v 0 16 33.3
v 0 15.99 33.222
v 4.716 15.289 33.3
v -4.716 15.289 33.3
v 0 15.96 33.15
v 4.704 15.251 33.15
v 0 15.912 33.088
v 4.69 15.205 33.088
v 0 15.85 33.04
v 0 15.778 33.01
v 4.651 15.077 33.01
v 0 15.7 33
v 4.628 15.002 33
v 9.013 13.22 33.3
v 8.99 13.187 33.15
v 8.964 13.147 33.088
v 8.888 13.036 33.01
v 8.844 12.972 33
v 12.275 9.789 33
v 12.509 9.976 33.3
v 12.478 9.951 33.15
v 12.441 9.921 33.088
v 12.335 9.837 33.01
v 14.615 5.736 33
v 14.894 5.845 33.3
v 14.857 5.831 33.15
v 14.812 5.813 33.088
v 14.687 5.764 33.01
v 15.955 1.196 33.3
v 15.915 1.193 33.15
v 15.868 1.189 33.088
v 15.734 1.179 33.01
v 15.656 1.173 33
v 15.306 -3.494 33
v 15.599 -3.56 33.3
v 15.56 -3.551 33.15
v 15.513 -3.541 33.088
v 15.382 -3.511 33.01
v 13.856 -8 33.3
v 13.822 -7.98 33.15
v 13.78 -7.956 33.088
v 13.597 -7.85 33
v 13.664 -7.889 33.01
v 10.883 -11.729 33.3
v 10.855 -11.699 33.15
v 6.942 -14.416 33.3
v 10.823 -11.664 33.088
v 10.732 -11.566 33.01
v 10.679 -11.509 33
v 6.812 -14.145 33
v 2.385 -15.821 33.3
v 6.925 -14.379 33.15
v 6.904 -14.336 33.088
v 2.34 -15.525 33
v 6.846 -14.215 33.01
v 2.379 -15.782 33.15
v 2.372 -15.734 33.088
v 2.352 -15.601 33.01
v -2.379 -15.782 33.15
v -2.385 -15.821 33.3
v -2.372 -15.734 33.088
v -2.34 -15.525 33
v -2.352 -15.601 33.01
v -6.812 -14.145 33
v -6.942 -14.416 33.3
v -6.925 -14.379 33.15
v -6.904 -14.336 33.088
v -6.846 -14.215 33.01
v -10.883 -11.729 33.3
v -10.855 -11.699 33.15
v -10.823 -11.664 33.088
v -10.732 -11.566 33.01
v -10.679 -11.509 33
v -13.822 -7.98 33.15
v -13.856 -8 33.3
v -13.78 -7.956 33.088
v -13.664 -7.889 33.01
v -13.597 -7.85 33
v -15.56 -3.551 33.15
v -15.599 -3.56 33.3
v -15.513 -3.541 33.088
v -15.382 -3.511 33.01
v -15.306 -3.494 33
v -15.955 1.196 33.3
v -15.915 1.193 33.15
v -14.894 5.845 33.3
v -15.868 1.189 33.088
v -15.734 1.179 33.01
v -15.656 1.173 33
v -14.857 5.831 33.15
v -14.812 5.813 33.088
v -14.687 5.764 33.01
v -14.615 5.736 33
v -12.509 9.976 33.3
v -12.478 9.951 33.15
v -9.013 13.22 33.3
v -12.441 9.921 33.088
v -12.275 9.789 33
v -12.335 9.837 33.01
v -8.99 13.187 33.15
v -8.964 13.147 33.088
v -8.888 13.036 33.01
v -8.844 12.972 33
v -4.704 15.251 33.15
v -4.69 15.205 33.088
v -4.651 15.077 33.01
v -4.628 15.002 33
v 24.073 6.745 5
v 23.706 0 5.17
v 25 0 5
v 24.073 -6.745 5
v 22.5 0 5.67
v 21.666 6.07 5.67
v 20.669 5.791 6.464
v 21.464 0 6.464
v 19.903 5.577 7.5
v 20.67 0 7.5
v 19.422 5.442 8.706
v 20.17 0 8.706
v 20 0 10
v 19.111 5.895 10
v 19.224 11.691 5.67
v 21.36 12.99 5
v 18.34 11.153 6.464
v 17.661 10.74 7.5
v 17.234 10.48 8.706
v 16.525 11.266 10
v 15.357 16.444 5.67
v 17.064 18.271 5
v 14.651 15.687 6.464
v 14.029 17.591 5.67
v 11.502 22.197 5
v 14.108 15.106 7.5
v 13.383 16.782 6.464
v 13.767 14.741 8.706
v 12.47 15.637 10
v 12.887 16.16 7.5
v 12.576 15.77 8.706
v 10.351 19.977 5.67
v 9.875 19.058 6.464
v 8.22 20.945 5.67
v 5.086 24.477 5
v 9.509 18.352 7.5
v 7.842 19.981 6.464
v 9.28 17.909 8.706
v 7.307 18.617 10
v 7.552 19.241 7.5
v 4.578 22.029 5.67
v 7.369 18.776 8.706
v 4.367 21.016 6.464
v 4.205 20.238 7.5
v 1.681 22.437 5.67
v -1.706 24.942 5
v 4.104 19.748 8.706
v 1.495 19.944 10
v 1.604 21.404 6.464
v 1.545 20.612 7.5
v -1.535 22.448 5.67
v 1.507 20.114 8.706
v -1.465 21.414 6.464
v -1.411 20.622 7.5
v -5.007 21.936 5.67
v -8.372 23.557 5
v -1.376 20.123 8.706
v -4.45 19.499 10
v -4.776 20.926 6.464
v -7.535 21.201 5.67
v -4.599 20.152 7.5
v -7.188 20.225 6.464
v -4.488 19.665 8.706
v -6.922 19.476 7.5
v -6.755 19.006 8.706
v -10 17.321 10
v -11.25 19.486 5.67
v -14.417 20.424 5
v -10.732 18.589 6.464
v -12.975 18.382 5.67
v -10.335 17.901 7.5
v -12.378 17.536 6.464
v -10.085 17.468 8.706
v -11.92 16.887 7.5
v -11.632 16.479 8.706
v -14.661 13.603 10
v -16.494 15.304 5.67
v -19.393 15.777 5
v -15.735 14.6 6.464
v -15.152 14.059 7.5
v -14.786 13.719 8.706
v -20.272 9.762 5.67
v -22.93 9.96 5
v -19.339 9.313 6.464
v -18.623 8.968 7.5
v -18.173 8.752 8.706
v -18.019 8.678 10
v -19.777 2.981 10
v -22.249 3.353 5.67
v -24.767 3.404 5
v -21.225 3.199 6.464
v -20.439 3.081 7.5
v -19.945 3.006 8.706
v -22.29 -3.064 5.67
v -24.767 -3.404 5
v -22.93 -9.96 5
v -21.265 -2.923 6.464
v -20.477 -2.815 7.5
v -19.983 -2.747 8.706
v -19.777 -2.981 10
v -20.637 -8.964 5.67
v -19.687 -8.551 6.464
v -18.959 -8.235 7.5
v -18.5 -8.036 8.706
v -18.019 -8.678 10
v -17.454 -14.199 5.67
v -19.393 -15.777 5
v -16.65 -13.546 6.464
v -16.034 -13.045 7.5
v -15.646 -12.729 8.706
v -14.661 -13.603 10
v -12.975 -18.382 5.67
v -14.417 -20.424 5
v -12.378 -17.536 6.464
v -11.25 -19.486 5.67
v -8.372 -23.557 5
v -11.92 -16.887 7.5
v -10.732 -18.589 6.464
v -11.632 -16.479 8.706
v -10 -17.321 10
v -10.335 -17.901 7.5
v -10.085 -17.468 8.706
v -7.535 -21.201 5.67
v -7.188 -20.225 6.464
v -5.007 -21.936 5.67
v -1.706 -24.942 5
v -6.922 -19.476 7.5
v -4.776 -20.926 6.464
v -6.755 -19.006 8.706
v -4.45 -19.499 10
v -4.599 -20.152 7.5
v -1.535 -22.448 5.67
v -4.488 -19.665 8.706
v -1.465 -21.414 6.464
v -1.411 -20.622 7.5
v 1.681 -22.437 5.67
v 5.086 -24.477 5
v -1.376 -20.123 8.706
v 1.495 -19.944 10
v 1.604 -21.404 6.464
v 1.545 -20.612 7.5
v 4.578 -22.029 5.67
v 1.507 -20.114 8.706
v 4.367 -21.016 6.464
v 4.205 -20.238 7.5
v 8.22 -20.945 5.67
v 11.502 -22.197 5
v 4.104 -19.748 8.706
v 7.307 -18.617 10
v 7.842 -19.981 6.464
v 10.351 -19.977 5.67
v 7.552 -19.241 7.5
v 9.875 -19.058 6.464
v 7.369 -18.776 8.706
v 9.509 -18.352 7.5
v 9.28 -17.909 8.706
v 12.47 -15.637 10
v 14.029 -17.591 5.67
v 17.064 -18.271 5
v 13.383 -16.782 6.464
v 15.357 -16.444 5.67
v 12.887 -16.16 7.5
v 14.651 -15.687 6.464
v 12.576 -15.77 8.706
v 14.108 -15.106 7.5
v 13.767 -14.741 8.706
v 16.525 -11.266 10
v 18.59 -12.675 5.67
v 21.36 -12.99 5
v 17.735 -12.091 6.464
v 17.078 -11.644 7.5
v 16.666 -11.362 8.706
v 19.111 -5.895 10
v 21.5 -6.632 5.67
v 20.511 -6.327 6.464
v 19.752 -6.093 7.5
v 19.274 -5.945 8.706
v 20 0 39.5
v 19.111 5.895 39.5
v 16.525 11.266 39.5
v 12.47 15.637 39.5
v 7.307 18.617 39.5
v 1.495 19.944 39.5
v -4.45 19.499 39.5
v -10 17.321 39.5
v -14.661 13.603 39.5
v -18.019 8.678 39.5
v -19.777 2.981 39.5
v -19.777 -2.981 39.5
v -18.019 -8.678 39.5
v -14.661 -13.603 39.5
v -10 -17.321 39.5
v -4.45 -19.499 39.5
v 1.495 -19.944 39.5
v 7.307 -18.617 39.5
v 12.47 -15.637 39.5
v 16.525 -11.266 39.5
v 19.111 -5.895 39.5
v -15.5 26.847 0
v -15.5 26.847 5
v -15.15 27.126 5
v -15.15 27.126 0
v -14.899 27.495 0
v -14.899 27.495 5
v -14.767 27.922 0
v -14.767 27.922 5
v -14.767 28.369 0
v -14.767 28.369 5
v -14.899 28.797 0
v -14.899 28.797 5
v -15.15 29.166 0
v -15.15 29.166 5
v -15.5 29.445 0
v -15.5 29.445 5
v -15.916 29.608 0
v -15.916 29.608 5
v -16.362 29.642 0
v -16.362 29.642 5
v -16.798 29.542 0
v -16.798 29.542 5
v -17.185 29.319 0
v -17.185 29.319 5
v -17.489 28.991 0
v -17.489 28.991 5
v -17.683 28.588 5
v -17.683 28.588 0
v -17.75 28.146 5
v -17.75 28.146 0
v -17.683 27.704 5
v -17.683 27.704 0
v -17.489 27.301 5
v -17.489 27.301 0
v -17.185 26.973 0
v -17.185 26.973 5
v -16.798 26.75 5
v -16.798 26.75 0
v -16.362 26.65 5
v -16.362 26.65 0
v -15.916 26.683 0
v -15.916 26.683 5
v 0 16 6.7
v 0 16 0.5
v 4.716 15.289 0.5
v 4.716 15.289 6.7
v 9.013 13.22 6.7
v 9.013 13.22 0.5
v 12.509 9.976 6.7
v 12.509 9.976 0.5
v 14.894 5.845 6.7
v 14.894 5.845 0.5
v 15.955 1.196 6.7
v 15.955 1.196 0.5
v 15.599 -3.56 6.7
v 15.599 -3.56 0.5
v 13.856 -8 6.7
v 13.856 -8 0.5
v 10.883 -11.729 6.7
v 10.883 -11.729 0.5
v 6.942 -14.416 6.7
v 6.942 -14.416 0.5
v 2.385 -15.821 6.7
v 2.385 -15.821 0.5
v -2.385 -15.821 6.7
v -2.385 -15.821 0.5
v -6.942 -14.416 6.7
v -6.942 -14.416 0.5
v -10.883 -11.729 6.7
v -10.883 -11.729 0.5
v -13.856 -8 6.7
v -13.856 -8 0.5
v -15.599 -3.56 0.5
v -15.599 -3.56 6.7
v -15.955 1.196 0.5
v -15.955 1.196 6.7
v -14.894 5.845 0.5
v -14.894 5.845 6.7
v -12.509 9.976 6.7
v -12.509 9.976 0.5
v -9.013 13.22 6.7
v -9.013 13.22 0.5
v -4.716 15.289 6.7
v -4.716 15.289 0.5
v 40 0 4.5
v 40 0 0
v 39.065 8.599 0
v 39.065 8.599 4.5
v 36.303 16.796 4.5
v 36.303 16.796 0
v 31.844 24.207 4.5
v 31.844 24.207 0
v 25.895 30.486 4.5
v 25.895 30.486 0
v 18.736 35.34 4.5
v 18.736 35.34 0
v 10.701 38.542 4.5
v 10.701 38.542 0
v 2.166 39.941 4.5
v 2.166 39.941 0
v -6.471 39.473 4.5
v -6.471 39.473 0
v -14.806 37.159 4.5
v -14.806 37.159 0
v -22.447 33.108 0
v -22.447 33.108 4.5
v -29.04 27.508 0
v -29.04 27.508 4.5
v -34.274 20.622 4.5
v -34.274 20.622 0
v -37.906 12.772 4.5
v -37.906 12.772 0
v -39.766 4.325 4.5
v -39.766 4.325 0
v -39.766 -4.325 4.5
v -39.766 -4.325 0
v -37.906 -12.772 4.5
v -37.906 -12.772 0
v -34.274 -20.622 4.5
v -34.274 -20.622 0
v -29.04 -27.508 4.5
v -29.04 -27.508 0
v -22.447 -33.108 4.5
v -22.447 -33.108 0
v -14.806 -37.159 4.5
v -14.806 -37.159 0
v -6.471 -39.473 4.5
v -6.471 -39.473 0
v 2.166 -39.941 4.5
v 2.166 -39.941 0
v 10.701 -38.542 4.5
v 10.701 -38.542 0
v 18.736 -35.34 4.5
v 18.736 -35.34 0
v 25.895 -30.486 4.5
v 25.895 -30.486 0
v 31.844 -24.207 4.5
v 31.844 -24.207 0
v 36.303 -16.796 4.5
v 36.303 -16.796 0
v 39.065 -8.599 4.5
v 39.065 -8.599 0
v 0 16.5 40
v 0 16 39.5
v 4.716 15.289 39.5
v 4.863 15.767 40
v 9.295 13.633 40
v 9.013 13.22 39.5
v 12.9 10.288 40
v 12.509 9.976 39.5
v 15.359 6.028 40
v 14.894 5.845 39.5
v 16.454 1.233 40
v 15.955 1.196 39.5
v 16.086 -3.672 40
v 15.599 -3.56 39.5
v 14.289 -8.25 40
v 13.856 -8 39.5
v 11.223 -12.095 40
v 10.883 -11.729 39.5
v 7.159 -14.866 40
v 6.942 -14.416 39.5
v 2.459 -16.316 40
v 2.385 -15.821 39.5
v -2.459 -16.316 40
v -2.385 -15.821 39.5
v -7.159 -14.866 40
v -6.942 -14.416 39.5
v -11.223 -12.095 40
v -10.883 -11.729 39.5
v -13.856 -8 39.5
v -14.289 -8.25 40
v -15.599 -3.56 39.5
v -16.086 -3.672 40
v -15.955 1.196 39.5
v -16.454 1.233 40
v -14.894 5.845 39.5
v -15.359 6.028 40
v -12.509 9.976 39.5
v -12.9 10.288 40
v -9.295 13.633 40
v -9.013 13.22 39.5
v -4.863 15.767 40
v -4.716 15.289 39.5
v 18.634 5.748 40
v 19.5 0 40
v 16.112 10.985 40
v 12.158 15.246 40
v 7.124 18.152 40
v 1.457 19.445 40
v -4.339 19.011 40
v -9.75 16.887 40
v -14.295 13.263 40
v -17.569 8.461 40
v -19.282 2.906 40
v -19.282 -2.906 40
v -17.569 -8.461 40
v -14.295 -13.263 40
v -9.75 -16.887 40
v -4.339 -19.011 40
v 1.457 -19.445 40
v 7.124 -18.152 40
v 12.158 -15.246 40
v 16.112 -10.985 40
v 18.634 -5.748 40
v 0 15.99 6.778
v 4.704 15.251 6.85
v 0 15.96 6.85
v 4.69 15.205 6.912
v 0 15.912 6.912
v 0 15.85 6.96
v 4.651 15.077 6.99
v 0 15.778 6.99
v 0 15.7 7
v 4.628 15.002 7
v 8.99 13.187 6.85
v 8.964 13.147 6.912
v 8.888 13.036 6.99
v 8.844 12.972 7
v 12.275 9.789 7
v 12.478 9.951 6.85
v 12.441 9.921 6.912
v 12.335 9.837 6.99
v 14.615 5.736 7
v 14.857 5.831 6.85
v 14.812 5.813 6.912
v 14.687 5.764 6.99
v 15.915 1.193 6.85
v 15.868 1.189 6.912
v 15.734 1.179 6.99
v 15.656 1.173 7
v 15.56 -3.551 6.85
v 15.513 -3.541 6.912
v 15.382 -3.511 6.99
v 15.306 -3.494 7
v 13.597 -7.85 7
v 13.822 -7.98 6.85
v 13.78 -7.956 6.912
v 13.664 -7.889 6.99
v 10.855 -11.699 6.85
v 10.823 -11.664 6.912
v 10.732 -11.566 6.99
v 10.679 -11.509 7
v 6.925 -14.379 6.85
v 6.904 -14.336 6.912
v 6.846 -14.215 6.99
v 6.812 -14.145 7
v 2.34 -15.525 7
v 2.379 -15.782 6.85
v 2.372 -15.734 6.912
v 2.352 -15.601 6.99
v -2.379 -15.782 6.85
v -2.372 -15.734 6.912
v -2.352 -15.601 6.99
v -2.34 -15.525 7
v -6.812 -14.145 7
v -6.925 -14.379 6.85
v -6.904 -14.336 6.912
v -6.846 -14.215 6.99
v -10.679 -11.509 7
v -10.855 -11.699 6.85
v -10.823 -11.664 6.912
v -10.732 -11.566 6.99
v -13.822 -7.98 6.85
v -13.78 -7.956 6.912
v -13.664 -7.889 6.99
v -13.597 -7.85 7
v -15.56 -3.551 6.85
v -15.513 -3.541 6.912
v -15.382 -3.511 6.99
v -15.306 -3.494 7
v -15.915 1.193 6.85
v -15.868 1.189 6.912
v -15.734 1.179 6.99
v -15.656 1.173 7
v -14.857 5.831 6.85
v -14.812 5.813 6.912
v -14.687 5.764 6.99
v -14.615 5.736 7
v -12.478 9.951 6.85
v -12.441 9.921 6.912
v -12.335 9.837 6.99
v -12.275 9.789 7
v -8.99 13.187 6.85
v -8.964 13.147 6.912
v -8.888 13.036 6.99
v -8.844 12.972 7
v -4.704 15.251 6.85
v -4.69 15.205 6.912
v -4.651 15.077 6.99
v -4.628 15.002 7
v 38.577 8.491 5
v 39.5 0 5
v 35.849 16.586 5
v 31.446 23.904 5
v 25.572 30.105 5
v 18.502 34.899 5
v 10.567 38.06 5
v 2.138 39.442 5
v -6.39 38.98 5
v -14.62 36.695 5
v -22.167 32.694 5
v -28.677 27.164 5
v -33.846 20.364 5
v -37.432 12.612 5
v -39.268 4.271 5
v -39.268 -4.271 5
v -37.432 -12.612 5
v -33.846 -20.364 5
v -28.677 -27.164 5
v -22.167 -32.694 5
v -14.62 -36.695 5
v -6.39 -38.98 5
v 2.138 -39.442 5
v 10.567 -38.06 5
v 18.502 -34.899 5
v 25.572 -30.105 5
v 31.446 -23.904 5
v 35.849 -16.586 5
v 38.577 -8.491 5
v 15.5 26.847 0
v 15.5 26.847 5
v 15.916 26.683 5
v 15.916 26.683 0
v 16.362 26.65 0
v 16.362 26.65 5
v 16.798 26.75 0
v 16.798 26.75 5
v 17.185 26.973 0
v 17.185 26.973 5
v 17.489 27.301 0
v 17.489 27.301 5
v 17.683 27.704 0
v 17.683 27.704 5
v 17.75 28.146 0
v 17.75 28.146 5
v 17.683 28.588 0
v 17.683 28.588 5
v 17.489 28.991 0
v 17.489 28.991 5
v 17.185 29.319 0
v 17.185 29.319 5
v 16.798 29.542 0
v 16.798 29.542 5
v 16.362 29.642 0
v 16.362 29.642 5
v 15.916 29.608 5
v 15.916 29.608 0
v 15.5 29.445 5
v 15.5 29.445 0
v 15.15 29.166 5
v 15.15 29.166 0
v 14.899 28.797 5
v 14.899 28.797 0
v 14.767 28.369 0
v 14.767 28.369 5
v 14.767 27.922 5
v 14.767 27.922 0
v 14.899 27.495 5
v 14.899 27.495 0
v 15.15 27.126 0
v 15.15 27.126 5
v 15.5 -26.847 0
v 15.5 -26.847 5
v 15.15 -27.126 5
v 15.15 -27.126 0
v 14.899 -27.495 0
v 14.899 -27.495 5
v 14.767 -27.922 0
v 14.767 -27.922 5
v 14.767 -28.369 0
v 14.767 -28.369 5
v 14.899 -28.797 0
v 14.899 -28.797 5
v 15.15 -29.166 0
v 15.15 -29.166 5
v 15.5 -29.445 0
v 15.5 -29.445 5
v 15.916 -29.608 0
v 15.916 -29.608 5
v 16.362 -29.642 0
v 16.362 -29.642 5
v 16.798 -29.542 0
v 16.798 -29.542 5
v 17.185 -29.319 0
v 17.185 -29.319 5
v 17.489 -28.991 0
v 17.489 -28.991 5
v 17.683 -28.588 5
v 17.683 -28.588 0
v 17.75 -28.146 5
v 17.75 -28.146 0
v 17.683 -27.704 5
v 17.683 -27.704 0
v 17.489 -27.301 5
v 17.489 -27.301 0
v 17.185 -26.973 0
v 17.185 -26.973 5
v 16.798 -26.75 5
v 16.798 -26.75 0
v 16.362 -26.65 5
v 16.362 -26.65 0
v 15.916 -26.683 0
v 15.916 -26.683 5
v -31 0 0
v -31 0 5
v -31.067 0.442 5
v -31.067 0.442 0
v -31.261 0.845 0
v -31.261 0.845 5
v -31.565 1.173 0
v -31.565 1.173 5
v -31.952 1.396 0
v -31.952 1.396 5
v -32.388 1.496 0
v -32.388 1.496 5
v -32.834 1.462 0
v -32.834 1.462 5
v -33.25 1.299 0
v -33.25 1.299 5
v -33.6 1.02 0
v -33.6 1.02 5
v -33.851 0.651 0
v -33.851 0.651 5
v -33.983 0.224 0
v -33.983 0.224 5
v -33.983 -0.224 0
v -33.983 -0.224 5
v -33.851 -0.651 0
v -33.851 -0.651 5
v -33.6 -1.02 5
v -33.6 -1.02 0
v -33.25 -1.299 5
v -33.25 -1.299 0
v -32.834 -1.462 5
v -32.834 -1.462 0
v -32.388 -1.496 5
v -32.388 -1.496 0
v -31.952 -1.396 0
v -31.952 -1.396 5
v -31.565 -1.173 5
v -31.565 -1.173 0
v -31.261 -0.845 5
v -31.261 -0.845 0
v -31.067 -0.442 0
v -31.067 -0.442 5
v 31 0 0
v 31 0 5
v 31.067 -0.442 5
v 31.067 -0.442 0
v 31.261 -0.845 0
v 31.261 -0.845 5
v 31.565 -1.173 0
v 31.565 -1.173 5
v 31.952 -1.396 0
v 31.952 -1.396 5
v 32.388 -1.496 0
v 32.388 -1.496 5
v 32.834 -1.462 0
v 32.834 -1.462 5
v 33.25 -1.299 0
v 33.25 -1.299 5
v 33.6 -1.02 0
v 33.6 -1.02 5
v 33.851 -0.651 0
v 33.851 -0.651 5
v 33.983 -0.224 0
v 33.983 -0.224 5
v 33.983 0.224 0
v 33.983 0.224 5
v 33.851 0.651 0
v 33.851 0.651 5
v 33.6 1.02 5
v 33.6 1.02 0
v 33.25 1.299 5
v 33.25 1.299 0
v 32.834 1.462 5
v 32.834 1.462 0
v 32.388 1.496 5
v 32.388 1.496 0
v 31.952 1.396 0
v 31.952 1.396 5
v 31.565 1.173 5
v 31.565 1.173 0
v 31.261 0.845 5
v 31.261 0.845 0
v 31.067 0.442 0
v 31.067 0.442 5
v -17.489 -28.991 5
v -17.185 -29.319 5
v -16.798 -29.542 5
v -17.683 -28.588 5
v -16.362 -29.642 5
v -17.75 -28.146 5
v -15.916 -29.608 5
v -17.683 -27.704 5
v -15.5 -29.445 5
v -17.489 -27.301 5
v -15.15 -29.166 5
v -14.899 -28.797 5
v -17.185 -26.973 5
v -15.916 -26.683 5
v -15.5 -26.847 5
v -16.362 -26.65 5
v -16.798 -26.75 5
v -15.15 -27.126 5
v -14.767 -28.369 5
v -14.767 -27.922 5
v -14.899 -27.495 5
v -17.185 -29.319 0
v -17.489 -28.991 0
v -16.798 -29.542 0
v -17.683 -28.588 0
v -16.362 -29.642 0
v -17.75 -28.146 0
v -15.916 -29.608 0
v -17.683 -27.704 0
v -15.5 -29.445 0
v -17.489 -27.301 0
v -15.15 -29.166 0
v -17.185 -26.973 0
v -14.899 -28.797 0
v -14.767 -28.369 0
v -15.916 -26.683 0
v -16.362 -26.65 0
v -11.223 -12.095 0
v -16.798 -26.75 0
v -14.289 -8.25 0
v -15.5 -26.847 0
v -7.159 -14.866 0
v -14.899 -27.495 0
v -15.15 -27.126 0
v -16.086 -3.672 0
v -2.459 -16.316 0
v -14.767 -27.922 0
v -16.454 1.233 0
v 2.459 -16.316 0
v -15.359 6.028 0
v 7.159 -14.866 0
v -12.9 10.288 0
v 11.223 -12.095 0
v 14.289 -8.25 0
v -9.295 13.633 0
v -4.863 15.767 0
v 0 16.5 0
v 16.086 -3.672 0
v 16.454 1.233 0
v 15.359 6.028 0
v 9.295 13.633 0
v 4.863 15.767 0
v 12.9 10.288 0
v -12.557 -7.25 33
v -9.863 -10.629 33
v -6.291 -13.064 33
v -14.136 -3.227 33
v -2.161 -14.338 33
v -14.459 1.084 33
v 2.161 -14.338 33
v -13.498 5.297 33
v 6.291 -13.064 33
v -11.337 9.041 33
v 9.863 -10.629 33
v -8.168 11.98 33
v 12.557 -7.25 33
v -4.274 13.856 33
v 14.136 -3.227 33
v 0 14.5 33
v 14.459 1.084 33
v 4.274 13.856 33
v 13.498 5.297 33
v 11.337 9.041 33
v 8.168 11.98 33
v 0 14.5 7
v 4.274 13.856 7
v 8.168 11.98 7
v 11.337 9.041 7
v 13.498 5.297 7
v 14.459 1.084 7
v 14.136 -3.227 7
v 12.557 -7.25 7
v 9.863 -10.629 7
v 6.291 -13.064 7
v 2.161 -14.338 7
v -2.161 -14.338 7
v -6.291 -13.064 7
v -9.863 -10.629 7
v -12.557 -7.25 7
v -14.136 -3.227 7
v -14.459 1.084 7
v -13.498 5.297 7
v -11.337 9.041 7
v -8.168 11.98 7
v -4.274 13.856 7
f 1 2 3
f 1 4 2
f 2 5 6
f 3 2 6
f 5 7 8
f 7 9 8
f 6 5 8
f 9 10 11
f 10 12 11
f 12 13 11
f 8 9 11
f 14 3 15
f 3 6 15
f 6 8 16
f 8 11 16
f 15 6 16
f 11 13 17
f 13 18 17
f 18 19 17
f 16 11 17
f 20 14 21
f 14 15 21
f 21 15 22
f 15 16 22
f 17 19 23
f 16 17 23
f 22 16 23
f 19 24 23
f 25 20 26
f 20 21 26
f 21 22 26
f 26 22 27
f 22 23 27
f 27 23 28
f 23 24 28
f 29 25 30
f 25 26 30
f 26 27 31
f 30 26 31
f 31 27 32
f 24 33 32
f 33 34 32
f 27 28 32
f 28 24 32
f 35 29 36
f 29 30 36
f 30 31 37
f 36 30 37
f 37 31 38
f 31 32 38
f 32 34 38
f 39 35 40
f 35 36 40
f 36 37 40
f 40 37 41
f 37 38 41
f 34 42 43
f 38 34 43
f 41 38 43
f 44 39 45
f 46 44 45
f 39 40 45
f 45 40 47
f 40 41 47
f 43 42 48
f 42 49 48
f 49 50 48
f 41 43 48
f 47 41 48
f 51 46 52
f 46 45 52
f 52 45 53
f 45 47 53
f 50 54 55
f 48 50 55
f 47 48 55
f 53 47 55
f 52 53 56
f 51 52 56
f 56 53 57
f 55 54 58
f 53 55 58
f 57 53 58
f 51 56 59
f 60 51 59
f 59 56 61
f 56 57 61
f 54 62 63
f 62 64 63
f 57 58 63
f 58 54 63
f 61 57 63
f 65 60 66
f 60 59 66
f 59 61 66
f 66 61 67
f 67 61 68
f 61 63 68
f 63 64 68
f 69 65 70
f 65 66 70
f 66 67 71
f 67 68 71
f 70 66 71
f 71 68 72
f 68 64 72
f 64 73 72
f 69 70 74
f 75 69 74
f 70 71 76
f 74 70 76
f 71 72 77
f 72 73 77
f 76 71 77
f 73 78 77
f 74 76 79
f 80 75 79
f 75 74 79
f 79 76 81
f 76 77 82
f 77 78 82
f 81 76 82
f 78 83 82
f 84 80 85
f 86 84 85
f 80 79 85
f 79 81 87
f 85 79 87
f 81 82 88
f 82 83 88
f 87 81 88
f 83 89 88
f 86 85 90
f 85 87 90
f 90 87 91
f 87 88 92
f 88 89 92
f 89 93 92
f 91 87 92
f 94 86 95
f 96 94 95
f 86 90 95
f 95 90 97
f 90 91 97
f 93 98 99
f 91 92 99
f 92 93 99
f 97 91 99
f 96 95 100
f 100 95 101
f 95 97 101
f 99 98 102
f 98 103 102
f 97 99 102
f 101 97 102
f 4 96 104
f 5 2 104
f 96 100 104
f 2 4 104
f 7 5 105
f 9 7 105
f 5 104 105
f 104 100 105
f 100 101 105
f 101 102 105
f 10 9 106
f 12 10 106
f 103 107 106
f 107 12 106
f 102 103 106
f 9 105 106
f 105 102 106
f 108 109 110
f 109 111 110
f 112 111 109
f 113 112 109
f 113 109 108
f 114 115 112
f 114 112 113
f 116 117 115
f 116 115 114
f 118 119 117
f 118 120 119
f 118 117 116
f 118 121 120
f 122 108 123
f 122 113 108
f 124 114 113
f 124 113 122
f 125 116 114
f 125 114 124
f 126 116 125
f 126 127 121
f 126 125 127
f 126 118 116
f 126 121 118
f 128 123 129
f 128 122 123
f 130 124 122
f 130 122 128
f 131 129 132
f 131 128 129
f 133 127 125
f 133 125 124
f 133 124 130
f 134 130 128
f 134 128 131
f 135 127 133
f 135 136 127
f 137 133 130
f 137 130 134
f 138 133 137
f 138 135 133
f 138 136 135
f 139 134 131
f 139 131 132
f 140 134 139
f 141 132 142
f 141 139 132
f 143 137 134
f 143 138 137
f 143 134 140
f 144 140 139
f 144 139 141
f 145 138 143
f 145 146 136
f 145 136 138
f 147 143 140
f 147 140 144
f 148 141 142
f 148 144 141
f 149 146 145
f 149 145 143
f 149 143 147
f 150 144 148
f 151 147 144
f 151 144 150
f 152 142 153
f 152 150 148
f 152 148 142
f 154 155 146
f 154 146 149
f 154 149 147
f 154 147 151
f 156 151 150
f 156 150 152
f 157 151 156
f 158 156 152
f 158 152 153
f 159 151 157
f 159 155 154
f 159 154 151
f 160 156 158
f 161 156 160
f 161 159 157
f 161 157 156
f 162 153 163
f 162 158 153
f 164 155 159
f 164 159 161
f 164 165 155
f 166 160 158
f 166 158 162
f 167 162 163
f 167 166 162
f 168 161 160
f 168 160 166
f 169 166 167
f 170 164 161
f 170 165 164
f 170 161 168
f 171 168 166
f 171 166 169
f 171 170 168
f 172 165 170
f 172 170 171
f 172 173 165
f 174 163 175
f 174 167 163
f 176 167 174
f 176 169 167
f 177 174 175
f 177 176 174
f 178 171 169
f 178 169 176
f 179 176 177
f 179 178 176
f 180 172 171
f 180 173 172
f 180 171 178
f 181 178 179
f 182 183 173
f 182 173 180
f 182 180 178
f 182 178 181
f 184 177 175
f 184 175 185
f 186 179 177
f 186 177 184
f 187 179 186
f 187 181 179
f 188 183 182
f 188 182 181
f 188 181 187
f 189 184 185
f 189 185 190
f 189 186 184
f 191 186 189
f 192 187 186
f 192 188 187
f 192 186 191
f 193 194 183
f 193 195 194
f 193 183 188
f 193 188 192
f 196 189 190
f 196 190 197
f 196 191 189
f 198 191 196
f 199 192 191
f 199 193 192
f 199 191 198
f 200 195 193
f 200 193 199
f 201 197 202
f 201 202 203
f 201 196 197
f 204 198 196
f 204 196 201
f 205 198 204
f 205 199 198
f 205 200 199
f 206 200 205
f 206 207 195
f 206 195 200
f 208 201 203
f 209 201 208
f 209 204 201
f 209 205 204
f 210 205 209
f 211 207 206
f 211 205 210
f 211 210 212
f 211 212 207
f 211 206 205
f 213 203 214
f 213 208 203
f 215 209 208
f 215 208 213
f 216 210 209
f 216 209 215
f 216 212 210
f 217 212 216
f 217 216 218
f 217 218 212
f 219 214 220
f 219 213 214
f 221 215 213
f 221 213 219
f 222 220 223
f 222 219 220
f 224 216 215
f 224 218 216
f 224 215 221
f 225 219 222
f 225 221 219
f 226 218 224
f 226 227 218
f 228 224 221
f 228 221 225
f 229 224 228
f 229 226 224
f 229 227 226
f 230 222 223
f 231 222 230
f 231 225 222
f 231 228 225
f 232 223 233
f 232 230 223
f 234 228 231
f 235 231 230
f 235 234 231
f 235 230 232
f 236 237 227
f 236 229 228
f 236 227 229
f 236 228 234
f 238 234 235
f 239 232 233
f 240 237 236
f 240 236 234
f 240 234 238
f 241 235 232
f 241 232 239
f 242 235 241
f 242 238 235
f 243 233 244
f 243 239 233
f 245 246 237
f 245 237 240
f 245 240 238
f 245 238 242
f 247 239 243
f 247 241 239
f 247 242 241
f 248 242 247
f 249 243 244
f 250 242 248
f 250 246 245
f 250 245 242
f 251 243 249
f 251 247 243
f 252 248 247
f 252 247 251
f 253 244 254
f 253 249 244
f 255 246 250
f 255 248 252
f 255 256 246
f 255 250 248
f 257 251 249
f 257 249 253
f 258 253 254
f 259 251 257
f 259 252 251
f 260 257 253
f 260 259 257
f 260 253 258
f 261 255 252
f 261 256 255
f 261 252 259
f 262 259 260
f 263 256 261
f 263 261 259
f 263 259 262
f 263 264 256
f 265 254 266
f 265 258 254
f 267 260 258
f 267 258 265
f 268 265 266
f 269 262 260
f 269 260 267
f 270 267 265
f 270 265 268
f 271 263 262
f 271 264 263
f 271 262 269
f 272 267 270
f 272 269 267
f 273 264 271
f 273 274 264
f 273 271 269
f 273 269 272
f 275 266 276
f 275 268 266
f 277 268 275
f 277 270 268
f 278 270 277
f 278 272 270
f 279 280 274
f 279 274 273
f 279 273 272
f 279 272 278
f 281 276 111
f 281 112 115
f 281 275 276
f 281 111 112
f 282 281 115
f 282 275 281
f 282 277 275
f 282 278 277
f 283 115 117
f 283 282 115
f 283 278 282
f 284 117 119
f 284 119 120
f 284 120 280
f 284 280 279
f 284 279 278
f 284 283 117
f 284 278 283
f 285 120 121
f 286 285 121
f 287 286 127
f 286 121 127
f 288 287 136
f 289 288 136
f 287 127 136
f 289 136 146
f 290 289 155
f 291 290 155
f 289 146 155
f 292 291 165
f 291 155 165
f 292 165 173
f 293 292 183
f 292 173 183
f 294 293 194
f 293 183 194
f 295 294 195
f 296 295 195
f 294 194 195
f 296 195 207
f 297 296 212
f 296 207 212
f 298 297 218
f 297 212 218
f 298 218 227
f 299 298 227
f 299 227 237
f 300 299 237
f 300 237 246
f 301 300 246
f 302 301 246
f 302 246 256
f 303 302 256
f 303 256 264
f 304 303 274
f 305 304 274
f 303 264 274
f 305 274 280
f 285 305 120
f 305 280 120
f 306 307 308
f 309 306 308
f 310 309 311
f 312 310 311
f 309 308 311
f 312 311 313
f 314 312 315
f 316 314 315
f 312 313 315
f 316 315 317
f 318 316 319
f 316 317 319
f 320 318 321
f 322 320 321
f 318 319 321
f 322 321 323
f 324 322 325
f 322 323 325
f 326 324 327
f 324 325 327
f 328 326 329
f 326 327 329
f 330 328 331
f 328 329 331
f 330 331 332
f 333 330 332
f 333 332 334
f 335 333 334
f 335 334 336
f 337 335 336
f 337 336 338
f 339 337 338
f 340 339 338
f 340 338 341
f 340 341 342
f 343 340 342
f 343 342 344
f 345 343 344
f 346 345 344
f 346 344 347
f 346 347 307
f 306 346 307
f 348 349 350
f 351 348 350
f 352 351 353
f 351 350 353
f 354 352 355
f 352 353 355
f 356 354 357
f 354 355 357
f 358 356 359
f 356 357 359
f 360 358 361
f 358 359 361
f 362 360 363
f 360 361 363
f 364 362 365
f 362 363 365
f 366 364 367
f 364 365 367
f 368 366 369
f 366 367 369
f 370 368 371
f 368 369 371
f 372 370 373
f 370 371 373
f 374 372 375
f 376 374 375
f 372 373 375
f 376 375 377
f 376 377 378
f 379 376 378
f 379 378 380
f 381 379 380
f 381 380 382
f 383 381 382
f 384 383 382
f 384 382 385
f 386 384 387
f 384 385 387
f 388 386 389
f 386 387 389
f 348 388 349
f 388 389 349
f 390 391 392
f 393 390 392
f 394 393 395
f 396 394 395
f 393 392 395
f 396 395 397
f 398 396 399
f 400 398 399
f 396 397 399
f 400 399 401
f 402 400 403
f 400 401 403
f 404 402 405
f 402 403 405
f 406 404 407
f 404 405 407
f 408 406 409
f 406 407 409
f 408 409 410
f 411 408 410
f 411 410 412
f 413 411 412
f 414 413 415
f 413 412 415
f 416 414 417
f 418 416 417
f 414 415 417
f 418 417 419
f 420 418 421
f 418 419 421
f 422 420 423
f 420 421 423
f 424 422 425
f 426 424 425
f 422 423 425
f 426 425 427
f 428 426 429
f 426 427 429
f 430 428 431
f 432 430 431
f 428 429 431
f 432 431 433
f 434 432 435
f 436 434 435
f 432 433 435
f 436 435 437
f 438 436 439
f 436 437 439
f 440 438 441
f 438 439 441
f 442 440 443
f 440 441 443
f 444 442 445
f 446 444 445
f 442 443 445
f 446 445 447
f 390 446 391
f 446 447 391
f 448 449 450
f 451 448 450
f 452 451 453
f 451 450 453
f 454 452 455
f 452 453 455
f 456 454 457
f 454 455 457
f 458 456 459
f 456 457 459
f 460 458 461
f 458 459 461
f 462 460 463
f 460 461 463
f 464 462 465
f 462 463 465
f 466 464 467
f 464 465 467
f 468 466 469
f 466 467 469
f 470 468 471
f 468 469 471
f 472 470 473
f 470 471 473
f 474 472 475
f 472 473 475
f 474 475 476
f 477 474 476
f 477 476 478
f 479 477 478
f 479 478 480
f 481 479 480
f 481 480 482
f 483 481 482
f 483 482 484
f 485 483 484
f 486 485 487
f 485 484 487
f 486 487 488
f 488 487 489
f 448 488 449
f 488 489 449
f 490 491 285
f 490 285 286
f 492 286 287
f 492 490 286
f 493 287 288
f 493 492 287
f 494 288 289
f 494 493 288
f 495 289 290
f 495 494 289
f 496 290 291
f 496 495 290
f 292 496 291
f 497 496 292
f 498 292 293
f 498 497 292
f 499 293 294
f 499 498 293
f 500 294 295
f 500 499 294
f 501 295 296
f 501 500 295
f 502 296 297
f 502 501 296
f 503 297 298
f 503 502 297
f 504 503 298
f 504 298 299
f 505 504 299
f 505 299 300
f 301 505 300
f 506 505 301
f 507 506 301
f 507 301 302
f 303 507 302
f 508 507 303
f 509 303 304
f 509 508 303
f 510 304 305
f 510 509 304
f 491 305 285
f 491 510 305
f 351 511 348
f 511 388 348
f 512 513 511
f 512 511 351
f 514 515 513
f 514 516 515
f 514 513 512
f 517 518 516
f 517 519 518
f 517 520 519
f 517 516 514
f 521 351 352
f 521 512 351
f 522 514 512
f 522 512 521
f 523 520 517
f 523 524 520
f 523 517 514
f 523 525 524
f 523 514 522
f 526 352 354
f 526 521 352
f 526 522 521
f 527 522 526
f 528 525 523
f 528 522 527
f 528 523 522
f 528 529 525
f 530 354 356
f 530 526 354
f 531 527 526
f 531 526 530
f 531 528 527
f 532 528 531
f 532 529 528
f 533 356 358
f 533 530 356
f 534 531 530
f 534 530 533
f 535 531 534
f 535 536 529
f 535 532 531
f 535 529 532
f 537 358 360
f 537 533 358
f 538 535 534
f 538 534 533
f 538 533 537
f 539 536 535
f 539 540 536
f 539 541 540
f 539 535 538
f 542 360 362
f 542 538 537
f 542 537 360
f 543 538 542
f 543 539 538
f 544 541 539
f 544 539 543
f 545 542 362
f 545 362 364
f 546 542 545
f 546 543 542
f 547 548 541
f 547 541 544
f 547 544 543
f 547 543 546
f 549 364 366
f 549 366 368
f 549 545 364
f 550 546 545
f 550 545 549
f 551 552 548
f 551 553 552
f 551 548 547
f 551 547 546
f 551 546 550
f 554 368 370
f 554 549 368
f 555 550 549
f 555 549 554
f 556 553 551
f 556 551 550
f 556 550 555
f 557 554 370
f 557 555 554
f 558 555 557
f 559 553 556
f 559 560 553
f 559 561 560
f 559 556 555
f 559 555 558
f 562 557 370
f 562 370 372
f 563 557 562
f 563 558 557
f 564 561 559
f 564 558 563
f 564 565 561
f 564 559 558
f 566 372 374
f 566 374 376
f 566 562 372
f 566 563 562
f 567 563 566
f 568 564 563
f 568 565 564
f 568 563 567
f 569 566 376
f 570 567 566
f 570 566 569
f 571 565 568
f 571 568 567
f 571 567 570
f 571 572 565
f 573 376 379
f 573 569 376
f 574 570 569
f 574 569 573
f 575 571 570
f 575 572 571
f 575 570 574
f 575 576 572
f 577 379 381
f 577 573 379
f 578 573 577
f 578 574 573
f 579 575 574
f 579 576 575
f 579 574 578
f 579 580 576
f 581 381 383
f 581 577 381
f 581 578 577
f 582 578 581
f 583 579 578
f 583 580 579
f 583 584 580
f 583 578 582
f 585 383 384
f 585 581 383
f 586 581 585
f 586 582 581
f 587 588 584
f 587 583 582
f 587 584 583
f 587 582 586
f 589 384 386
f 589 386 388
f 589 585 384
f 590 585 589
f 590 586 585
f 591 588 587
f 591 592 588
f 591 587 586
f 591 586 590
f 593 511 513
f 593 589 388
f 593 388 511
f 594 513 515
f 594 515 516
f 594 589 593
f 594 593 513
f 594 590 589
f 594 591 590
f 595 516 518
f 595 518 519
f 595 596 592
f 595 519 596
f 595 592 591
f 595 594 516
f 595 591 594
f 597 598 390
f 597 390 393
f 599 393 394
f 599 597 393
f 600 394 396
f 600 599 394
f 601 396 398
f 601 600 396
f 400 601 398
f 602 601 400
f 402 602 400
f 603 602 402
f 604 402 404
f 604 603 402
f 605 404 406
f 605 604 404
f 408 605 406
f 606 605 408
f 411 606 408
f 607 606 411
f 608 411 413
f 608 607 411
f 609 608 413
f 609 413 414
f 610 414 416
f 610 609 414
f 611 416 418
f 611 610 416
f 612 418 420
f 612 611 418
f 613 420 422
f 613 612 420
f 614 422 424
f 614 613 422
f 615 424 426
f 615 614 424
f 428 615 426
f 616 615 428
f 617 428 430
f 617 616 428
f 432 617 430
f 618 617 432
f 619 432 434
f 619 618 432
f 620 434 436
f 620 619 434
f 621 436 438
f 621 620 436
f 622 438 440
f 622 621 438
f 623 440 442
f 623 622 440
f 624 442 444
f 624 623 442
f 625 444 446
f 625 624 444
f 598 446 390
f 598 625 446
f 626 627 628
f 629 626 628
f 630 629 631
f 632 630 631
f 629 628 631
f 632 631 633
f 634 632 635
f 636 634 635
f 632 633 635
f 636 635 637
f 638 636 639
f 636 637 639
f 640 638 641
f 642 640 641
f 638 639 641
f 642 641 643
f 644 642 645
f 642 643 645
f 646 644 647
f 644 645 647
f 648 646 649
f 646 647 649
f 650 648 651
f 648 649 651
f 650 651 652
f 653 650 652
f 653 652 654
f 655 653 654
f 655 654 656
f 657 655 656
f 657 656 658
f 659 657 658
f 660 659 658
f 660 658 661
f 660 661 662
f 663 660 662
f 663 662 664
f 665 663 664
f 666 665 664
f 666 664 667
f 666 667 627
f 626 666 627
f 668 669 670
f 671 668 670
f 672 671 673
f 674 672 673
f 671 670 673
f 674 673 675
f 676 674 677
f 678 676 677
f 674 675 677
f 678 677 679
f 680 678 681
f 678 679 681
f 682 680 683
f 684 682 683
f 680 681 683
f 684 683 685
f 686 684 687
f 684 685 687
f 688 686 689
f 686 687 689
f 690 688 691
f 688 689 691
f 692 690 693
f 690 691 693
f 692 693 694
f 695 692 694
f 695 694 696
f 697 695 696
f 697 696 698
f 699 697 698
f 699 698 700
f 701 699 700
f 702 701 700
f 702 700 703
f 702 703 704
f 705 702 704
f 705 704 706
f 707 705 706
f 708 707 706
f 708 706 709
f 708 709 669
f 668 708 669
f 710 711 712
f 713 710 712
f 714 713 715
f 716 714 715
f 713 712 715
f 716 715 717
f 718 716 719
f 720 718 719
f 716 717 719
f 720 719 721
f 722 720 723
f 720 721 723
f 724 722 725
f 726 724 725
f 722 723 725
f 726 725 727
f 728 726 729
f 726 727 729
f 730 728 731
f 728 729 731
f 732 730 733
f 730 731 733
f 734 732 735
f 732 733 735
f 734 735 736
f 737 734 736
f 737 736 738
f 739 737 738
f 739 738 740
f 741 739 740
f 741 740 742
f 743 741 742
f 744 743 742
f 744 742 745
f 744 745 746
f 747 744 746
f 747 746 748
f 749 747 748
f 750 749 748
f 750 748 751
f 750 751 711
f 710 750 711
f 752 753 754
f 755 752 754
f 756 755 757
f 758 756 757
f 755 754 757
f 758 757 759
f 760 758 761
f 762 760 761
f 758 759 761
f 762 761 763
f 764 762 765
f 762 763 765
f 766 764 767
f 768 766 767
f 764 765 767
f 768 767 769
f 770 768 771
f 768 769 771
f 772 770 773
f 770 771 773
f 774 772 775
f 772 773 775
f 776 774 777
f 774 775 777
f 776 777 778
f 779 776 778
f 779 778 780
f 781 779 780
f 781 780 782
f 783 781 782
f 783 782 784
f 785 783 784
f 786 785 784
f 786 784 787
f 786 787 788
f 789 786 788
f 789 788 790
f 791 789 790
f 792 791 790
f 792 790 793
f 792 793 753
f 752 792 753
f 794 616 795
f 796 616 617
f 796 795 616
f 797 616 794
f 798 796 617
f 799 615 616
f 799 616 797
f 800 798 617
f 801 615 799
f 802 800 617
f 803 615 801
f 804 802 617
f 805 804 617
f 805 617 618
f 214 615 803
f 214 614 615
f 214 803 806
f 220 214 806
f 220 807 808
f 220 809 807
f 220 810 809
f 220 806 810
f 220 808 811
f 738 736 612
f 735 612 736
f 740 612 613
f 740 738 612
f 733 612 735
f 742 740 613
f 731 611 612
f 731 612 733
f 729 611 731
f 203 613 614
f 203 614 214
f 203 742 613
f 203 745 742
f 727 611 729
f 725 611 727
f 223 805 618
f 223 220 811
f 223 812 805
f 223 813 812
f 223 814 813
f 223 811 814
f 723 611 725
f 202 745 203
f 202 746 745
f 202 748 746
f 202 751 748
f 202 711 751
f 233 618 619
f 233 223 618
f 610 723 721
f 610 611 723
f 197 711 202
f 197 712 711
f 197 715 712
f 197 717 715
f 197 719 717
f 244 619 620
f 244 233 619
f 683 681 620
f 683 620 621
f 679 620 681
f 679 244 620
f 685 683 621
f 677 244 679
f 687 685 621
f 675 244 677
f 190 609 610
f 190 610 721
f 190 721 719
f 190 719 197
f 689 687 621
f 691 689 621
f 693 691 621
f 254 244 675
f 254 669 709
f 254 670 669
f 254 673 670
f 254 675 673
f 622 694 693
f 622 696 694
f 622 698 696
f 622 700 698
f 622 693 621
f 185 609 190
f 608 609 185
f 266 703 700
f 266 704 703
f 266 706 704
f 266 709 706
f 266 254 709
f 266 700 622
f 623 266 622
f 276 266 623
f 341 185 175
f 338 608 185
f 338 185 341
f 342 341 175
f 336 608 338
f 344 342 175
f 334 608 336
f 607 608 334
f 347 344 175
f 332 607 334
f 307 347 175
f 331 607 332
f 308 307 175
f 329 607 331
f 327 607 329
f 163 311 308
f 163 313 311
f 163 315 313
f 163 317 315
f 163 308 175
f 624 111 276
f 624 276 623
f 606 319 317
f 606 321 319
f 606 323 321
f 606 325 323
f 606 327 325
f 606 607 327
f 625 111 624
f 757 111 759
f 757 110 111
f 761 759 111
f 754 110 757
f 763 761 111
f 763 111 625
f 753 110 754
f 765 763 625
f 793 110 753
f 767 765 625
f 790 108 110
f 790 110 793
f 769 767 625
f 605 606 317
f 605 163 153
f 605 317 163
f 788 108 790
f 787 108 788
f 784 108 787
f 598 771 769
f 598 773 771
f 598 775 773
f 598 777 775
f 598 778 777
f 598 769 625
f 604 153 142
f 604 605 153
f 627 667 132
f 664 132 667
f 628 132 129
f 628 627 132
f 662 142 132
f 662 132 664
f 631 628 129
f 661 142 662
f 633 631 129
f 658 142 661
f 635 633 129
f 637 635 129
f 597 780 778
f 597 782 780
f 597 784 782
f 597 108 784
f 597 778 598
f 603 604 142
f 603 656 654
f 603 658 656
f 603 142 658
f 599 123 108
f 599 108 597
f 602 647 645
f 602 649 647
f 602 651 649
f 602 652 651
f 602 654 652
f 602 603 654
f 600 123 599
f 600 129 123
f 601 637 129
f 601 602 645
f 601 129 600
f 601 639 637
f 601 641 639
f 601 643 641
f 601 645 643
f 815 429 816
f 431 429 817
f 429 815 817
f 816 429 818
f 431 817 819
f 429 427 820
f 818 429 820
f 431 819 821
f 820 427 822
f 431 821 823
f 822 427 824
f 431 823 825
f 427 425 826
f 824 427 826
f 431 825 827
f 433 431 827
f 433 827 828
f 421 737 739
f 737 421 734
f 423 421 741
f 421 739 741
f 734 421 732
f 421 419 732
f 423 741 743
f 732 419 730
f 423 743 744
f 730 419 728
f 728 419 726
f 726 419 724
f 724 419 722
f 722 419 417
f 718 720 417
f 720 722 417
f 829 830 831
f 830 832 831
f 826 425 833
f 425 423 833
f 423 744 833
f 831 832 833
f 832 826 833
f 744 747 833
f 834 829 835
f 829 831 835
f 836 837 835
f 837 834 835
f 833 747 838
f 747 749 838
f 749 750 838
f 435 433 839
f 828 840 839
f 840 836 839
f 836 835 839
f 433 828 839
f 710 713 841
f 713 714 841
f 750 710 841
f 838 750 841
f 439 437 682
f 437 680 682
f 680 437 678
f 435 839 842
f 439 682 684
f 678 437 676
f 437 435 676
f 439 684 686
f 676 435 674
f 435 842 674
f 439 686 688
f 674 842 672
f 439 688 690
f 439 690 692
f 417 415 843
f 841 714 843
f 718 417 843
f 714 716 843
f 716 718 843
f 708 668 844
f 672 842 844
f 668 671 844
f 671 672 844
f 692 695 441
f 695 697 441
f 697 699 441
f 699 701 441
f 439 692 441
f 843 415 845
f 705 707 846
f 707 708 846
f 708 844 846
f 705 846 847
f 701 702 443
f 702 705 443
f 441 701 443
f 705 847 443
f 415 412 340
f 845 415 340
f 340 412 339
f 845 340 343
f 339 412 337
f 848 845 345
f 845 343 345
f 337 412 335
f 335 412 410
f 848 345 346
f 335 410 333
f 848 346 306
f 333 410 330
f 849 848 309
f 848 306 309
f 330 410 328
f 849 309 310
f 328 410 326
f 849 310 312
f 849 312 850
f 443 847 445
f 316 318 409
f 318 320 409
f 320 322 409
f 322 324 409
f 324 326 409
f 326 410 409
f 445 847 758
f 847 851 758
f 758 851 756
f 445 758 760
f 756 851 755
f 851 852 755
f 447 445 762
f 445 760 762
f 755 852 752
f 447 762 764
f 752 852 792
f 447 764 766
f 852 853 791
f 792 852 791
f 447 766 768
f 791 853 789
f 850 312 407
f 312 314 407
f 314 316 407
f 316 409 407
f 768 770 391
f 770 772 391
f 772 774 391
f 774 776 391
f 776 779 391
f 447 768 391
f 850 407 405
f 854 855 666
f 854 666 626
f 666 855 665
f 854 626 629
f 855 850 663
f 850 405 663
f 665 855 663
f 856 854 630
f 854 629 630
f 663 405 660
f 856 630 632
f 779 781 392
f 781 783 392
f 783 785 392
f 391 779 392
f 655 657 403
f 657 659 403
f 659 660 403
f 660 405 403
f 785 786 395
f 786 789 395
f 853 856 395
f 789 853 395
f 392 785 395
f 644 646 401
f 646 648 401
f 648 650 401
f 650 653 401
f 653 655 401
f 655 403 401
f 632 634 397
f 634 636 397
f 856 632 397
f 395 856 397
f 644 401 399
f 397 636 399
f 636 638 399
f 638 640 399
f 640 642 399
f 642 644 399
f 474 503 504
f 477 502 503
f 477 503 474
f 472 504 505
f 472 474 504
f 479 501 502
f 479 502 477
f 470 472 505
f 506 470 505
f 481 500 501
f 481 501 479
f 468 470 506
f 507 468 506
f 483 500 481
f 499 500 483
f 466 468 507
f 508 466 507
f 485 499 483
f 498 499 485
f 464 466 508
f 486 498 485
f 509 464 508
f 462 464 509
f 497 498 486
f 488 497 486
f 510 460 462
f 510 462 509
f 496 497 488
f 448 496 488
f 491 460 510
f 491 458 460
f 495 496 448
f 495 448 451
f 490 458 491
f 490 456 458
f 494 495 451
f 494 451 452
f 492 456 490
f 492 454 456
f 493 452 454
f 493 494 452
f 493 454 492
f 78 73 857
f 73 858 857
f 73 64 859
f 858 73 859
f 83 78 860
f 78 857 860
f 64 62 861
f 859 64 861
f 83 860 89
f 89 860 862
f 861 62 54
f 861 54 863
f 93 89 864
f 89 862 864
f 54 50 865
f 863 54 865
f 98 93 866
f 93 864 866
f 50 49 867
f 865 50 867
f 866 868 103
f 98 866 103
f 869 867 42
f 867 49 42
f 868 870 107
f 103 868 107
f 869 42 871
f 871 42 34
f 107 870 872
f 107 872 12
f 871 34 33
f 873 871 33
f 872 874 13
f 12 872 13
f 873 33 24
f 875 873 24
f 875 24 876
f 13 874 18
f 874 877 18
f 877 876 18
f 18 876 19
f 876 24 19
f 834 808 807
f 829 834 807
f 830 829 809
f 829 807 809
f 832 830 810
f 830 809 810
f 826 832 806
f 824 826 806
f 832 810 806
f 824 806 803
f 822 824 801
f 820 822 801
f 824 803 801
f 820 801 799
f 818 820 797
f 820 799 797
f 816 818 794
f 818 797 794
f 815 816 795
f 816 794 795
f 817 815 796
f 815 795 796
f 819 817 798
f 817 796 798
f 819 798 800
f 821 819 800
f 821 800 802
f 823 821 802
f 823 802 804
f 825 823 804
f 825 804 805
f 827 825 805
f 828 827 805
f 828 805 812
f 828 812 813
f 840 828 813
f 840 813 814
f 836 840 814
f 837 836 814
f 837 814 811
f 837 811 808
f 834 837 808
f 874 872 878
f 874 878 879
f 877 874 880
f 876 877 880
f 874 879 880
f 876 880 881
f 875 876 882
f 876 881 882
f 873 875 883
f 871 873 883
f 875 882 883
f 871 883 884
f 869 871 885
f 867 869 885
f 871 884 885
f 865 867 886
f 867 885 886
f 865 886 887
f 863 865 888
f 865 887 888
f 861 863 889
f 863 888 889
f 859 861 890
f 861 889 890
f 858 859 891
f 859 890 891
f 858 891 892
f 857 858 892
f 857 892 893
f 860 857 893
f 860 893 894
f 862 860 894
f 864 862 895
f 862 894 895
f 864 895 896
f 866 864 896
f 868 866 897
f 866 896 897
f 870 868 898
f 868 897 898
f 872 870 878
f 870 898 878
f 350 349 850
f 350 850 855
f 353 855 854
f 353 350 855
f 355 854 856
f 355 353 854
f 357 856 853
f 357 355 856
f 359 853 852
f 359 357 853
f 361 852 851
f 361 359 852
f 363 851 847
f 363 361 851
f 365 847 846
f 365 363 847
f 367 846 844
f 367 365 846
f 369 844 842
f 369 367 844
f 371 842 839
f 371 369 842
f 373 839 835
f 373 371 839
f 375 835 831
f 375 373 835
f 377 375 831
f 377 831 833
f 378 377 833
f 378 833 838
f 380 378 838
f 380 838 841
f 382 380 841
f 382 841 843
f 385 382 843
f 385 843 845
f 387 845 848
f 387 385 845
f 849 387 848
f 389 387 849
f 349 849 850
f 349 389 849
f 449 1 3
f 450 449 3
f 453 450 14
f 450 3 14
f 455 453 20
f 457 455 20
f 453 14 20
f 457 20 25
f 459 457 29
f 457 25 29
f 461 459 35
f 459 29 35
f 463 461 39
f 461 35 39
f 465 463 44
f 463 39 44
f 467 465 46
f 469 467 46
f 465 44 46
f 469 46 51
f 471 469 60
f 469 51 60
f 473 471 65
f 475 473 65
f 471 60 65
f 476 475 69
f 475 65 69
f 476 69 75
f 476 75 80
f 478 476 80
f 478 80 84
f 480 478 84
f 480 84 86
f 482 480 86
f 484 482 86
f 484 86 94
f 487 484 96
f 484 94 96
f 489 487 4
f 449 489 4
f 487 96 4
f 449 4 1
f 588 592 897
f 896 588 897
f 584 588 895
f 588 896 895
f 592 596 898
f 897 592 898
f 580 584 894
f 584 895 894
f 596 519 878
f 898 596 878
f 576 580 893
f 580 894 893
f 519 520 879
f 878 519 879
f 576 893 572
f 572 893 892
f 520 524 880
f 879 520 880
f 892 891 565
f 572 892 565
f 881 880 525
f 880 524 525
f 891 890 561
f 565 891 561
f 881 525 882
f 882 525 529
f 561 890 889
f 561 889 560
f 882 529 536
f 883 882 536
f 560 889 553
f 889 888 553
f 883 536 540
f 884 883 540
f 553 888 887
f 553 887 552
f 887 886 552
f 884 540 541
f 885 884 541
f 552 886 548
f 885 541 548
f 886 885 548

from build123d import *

# Parameters (mm, degrees)
SKETCH1_R           = 40
BOSS_EXTRUDE1_DEPTH = 5
SKETCH2_R           = 20
BOSS_EXTRUDE2_DEPTH = 35
M4_TAPPED_HOLE1_D   = 3
CIRPATTERN2_COUNT   = 6
CHAMFER2_SIZE       = 0.5
FILLET1_R           = 5
FILLET2_R           = 0.3


with BuildPart() as part:
    # Sketch1 → Boss-Extrude1 (new body)
    with BuildSketch(Plane.XY):
        Circle(SKETCH1_R)
    extrude(amount=BOSS_EXTRUDE1_DEPTH)

    # Sketch2 → Boss-Extrude2 (add)
    with BuildSketch(Plane.XY.offset(5)):
        Circle(SKETCH2_R)
    extrude(amount=BOSS_EXTRUDE2_DEPTH)

    # Sketch6 → Cut-Revolve2 (revolve, cut)
    with BuildSketch(Plane(origin=(0, 0, 0), x_dir=(0, 0, -1), z_dir=(1, 0, 0))):
        Polygon((0, 0), (-40, 0), (-40, 16), (-33, 16), (-33, 14.5), (-7, 14.5), (-7, 16), (0, 16), align=None)
    revolve(axis=Axis((0, 0, 56.301231345), (0, 0, -1)), mode=Mode.SUBTRACT)

    # M4 Tapped Hole1 (through all)
    with Locations(Plane(origin=(0, 0, 0), x_dir=(1, 0, 0), z_dir=(0, 0, -1))):
        with Locations((32.5, 0)):
            m4_tapped_hole1 = Hole(M4_TAPPED_HOLE1_D / 2)

    # CirPattern2: M4 Tapped Hole1 ×6 about axis
    cirpattern2_axis = Axis((0, 0, 0), (0, 0, 1))
    for i in range(1, CIRPATTERN2_COUNT):
        add(m4_tapped_hole1.rotate(cirpattern2_axis, i * 360 / CIRPATTERN2_COUNT), mode=Mode.SUBTRACT)

    # Chamfer2
    chamfer2_edges = [part.edges().sort_by_distance(p)[0] for p in [
        (0, -16, 40),
        (0, -16, 0),
        (-40, 0, 5),
        (0, -16, 0),
        (0, -16, 40),
        (-20, 0, 40),
    ]]
    chamfer(chamfer2_edges, length=CHAMFER2_SIZE)

    # Fillet1
    fillet1_edges = [part.edges().sort_by_distance(p)[0] for p in [
        (-20, 0, 5),
    ]]
    fillet(fillet1_edges, radius=FILLET1_R)

    # Fillet2
    fillet2_edges = [part.edges().sort_by_distance(p)[0] for p in [
        (0, -16, 33),
        (0, -16, 7),
        (0, -16, 7),
        (0, -16, 33),
    ]]
    fillet(fillet2_edges, radius=FILLET2_R)


solid = part.part
